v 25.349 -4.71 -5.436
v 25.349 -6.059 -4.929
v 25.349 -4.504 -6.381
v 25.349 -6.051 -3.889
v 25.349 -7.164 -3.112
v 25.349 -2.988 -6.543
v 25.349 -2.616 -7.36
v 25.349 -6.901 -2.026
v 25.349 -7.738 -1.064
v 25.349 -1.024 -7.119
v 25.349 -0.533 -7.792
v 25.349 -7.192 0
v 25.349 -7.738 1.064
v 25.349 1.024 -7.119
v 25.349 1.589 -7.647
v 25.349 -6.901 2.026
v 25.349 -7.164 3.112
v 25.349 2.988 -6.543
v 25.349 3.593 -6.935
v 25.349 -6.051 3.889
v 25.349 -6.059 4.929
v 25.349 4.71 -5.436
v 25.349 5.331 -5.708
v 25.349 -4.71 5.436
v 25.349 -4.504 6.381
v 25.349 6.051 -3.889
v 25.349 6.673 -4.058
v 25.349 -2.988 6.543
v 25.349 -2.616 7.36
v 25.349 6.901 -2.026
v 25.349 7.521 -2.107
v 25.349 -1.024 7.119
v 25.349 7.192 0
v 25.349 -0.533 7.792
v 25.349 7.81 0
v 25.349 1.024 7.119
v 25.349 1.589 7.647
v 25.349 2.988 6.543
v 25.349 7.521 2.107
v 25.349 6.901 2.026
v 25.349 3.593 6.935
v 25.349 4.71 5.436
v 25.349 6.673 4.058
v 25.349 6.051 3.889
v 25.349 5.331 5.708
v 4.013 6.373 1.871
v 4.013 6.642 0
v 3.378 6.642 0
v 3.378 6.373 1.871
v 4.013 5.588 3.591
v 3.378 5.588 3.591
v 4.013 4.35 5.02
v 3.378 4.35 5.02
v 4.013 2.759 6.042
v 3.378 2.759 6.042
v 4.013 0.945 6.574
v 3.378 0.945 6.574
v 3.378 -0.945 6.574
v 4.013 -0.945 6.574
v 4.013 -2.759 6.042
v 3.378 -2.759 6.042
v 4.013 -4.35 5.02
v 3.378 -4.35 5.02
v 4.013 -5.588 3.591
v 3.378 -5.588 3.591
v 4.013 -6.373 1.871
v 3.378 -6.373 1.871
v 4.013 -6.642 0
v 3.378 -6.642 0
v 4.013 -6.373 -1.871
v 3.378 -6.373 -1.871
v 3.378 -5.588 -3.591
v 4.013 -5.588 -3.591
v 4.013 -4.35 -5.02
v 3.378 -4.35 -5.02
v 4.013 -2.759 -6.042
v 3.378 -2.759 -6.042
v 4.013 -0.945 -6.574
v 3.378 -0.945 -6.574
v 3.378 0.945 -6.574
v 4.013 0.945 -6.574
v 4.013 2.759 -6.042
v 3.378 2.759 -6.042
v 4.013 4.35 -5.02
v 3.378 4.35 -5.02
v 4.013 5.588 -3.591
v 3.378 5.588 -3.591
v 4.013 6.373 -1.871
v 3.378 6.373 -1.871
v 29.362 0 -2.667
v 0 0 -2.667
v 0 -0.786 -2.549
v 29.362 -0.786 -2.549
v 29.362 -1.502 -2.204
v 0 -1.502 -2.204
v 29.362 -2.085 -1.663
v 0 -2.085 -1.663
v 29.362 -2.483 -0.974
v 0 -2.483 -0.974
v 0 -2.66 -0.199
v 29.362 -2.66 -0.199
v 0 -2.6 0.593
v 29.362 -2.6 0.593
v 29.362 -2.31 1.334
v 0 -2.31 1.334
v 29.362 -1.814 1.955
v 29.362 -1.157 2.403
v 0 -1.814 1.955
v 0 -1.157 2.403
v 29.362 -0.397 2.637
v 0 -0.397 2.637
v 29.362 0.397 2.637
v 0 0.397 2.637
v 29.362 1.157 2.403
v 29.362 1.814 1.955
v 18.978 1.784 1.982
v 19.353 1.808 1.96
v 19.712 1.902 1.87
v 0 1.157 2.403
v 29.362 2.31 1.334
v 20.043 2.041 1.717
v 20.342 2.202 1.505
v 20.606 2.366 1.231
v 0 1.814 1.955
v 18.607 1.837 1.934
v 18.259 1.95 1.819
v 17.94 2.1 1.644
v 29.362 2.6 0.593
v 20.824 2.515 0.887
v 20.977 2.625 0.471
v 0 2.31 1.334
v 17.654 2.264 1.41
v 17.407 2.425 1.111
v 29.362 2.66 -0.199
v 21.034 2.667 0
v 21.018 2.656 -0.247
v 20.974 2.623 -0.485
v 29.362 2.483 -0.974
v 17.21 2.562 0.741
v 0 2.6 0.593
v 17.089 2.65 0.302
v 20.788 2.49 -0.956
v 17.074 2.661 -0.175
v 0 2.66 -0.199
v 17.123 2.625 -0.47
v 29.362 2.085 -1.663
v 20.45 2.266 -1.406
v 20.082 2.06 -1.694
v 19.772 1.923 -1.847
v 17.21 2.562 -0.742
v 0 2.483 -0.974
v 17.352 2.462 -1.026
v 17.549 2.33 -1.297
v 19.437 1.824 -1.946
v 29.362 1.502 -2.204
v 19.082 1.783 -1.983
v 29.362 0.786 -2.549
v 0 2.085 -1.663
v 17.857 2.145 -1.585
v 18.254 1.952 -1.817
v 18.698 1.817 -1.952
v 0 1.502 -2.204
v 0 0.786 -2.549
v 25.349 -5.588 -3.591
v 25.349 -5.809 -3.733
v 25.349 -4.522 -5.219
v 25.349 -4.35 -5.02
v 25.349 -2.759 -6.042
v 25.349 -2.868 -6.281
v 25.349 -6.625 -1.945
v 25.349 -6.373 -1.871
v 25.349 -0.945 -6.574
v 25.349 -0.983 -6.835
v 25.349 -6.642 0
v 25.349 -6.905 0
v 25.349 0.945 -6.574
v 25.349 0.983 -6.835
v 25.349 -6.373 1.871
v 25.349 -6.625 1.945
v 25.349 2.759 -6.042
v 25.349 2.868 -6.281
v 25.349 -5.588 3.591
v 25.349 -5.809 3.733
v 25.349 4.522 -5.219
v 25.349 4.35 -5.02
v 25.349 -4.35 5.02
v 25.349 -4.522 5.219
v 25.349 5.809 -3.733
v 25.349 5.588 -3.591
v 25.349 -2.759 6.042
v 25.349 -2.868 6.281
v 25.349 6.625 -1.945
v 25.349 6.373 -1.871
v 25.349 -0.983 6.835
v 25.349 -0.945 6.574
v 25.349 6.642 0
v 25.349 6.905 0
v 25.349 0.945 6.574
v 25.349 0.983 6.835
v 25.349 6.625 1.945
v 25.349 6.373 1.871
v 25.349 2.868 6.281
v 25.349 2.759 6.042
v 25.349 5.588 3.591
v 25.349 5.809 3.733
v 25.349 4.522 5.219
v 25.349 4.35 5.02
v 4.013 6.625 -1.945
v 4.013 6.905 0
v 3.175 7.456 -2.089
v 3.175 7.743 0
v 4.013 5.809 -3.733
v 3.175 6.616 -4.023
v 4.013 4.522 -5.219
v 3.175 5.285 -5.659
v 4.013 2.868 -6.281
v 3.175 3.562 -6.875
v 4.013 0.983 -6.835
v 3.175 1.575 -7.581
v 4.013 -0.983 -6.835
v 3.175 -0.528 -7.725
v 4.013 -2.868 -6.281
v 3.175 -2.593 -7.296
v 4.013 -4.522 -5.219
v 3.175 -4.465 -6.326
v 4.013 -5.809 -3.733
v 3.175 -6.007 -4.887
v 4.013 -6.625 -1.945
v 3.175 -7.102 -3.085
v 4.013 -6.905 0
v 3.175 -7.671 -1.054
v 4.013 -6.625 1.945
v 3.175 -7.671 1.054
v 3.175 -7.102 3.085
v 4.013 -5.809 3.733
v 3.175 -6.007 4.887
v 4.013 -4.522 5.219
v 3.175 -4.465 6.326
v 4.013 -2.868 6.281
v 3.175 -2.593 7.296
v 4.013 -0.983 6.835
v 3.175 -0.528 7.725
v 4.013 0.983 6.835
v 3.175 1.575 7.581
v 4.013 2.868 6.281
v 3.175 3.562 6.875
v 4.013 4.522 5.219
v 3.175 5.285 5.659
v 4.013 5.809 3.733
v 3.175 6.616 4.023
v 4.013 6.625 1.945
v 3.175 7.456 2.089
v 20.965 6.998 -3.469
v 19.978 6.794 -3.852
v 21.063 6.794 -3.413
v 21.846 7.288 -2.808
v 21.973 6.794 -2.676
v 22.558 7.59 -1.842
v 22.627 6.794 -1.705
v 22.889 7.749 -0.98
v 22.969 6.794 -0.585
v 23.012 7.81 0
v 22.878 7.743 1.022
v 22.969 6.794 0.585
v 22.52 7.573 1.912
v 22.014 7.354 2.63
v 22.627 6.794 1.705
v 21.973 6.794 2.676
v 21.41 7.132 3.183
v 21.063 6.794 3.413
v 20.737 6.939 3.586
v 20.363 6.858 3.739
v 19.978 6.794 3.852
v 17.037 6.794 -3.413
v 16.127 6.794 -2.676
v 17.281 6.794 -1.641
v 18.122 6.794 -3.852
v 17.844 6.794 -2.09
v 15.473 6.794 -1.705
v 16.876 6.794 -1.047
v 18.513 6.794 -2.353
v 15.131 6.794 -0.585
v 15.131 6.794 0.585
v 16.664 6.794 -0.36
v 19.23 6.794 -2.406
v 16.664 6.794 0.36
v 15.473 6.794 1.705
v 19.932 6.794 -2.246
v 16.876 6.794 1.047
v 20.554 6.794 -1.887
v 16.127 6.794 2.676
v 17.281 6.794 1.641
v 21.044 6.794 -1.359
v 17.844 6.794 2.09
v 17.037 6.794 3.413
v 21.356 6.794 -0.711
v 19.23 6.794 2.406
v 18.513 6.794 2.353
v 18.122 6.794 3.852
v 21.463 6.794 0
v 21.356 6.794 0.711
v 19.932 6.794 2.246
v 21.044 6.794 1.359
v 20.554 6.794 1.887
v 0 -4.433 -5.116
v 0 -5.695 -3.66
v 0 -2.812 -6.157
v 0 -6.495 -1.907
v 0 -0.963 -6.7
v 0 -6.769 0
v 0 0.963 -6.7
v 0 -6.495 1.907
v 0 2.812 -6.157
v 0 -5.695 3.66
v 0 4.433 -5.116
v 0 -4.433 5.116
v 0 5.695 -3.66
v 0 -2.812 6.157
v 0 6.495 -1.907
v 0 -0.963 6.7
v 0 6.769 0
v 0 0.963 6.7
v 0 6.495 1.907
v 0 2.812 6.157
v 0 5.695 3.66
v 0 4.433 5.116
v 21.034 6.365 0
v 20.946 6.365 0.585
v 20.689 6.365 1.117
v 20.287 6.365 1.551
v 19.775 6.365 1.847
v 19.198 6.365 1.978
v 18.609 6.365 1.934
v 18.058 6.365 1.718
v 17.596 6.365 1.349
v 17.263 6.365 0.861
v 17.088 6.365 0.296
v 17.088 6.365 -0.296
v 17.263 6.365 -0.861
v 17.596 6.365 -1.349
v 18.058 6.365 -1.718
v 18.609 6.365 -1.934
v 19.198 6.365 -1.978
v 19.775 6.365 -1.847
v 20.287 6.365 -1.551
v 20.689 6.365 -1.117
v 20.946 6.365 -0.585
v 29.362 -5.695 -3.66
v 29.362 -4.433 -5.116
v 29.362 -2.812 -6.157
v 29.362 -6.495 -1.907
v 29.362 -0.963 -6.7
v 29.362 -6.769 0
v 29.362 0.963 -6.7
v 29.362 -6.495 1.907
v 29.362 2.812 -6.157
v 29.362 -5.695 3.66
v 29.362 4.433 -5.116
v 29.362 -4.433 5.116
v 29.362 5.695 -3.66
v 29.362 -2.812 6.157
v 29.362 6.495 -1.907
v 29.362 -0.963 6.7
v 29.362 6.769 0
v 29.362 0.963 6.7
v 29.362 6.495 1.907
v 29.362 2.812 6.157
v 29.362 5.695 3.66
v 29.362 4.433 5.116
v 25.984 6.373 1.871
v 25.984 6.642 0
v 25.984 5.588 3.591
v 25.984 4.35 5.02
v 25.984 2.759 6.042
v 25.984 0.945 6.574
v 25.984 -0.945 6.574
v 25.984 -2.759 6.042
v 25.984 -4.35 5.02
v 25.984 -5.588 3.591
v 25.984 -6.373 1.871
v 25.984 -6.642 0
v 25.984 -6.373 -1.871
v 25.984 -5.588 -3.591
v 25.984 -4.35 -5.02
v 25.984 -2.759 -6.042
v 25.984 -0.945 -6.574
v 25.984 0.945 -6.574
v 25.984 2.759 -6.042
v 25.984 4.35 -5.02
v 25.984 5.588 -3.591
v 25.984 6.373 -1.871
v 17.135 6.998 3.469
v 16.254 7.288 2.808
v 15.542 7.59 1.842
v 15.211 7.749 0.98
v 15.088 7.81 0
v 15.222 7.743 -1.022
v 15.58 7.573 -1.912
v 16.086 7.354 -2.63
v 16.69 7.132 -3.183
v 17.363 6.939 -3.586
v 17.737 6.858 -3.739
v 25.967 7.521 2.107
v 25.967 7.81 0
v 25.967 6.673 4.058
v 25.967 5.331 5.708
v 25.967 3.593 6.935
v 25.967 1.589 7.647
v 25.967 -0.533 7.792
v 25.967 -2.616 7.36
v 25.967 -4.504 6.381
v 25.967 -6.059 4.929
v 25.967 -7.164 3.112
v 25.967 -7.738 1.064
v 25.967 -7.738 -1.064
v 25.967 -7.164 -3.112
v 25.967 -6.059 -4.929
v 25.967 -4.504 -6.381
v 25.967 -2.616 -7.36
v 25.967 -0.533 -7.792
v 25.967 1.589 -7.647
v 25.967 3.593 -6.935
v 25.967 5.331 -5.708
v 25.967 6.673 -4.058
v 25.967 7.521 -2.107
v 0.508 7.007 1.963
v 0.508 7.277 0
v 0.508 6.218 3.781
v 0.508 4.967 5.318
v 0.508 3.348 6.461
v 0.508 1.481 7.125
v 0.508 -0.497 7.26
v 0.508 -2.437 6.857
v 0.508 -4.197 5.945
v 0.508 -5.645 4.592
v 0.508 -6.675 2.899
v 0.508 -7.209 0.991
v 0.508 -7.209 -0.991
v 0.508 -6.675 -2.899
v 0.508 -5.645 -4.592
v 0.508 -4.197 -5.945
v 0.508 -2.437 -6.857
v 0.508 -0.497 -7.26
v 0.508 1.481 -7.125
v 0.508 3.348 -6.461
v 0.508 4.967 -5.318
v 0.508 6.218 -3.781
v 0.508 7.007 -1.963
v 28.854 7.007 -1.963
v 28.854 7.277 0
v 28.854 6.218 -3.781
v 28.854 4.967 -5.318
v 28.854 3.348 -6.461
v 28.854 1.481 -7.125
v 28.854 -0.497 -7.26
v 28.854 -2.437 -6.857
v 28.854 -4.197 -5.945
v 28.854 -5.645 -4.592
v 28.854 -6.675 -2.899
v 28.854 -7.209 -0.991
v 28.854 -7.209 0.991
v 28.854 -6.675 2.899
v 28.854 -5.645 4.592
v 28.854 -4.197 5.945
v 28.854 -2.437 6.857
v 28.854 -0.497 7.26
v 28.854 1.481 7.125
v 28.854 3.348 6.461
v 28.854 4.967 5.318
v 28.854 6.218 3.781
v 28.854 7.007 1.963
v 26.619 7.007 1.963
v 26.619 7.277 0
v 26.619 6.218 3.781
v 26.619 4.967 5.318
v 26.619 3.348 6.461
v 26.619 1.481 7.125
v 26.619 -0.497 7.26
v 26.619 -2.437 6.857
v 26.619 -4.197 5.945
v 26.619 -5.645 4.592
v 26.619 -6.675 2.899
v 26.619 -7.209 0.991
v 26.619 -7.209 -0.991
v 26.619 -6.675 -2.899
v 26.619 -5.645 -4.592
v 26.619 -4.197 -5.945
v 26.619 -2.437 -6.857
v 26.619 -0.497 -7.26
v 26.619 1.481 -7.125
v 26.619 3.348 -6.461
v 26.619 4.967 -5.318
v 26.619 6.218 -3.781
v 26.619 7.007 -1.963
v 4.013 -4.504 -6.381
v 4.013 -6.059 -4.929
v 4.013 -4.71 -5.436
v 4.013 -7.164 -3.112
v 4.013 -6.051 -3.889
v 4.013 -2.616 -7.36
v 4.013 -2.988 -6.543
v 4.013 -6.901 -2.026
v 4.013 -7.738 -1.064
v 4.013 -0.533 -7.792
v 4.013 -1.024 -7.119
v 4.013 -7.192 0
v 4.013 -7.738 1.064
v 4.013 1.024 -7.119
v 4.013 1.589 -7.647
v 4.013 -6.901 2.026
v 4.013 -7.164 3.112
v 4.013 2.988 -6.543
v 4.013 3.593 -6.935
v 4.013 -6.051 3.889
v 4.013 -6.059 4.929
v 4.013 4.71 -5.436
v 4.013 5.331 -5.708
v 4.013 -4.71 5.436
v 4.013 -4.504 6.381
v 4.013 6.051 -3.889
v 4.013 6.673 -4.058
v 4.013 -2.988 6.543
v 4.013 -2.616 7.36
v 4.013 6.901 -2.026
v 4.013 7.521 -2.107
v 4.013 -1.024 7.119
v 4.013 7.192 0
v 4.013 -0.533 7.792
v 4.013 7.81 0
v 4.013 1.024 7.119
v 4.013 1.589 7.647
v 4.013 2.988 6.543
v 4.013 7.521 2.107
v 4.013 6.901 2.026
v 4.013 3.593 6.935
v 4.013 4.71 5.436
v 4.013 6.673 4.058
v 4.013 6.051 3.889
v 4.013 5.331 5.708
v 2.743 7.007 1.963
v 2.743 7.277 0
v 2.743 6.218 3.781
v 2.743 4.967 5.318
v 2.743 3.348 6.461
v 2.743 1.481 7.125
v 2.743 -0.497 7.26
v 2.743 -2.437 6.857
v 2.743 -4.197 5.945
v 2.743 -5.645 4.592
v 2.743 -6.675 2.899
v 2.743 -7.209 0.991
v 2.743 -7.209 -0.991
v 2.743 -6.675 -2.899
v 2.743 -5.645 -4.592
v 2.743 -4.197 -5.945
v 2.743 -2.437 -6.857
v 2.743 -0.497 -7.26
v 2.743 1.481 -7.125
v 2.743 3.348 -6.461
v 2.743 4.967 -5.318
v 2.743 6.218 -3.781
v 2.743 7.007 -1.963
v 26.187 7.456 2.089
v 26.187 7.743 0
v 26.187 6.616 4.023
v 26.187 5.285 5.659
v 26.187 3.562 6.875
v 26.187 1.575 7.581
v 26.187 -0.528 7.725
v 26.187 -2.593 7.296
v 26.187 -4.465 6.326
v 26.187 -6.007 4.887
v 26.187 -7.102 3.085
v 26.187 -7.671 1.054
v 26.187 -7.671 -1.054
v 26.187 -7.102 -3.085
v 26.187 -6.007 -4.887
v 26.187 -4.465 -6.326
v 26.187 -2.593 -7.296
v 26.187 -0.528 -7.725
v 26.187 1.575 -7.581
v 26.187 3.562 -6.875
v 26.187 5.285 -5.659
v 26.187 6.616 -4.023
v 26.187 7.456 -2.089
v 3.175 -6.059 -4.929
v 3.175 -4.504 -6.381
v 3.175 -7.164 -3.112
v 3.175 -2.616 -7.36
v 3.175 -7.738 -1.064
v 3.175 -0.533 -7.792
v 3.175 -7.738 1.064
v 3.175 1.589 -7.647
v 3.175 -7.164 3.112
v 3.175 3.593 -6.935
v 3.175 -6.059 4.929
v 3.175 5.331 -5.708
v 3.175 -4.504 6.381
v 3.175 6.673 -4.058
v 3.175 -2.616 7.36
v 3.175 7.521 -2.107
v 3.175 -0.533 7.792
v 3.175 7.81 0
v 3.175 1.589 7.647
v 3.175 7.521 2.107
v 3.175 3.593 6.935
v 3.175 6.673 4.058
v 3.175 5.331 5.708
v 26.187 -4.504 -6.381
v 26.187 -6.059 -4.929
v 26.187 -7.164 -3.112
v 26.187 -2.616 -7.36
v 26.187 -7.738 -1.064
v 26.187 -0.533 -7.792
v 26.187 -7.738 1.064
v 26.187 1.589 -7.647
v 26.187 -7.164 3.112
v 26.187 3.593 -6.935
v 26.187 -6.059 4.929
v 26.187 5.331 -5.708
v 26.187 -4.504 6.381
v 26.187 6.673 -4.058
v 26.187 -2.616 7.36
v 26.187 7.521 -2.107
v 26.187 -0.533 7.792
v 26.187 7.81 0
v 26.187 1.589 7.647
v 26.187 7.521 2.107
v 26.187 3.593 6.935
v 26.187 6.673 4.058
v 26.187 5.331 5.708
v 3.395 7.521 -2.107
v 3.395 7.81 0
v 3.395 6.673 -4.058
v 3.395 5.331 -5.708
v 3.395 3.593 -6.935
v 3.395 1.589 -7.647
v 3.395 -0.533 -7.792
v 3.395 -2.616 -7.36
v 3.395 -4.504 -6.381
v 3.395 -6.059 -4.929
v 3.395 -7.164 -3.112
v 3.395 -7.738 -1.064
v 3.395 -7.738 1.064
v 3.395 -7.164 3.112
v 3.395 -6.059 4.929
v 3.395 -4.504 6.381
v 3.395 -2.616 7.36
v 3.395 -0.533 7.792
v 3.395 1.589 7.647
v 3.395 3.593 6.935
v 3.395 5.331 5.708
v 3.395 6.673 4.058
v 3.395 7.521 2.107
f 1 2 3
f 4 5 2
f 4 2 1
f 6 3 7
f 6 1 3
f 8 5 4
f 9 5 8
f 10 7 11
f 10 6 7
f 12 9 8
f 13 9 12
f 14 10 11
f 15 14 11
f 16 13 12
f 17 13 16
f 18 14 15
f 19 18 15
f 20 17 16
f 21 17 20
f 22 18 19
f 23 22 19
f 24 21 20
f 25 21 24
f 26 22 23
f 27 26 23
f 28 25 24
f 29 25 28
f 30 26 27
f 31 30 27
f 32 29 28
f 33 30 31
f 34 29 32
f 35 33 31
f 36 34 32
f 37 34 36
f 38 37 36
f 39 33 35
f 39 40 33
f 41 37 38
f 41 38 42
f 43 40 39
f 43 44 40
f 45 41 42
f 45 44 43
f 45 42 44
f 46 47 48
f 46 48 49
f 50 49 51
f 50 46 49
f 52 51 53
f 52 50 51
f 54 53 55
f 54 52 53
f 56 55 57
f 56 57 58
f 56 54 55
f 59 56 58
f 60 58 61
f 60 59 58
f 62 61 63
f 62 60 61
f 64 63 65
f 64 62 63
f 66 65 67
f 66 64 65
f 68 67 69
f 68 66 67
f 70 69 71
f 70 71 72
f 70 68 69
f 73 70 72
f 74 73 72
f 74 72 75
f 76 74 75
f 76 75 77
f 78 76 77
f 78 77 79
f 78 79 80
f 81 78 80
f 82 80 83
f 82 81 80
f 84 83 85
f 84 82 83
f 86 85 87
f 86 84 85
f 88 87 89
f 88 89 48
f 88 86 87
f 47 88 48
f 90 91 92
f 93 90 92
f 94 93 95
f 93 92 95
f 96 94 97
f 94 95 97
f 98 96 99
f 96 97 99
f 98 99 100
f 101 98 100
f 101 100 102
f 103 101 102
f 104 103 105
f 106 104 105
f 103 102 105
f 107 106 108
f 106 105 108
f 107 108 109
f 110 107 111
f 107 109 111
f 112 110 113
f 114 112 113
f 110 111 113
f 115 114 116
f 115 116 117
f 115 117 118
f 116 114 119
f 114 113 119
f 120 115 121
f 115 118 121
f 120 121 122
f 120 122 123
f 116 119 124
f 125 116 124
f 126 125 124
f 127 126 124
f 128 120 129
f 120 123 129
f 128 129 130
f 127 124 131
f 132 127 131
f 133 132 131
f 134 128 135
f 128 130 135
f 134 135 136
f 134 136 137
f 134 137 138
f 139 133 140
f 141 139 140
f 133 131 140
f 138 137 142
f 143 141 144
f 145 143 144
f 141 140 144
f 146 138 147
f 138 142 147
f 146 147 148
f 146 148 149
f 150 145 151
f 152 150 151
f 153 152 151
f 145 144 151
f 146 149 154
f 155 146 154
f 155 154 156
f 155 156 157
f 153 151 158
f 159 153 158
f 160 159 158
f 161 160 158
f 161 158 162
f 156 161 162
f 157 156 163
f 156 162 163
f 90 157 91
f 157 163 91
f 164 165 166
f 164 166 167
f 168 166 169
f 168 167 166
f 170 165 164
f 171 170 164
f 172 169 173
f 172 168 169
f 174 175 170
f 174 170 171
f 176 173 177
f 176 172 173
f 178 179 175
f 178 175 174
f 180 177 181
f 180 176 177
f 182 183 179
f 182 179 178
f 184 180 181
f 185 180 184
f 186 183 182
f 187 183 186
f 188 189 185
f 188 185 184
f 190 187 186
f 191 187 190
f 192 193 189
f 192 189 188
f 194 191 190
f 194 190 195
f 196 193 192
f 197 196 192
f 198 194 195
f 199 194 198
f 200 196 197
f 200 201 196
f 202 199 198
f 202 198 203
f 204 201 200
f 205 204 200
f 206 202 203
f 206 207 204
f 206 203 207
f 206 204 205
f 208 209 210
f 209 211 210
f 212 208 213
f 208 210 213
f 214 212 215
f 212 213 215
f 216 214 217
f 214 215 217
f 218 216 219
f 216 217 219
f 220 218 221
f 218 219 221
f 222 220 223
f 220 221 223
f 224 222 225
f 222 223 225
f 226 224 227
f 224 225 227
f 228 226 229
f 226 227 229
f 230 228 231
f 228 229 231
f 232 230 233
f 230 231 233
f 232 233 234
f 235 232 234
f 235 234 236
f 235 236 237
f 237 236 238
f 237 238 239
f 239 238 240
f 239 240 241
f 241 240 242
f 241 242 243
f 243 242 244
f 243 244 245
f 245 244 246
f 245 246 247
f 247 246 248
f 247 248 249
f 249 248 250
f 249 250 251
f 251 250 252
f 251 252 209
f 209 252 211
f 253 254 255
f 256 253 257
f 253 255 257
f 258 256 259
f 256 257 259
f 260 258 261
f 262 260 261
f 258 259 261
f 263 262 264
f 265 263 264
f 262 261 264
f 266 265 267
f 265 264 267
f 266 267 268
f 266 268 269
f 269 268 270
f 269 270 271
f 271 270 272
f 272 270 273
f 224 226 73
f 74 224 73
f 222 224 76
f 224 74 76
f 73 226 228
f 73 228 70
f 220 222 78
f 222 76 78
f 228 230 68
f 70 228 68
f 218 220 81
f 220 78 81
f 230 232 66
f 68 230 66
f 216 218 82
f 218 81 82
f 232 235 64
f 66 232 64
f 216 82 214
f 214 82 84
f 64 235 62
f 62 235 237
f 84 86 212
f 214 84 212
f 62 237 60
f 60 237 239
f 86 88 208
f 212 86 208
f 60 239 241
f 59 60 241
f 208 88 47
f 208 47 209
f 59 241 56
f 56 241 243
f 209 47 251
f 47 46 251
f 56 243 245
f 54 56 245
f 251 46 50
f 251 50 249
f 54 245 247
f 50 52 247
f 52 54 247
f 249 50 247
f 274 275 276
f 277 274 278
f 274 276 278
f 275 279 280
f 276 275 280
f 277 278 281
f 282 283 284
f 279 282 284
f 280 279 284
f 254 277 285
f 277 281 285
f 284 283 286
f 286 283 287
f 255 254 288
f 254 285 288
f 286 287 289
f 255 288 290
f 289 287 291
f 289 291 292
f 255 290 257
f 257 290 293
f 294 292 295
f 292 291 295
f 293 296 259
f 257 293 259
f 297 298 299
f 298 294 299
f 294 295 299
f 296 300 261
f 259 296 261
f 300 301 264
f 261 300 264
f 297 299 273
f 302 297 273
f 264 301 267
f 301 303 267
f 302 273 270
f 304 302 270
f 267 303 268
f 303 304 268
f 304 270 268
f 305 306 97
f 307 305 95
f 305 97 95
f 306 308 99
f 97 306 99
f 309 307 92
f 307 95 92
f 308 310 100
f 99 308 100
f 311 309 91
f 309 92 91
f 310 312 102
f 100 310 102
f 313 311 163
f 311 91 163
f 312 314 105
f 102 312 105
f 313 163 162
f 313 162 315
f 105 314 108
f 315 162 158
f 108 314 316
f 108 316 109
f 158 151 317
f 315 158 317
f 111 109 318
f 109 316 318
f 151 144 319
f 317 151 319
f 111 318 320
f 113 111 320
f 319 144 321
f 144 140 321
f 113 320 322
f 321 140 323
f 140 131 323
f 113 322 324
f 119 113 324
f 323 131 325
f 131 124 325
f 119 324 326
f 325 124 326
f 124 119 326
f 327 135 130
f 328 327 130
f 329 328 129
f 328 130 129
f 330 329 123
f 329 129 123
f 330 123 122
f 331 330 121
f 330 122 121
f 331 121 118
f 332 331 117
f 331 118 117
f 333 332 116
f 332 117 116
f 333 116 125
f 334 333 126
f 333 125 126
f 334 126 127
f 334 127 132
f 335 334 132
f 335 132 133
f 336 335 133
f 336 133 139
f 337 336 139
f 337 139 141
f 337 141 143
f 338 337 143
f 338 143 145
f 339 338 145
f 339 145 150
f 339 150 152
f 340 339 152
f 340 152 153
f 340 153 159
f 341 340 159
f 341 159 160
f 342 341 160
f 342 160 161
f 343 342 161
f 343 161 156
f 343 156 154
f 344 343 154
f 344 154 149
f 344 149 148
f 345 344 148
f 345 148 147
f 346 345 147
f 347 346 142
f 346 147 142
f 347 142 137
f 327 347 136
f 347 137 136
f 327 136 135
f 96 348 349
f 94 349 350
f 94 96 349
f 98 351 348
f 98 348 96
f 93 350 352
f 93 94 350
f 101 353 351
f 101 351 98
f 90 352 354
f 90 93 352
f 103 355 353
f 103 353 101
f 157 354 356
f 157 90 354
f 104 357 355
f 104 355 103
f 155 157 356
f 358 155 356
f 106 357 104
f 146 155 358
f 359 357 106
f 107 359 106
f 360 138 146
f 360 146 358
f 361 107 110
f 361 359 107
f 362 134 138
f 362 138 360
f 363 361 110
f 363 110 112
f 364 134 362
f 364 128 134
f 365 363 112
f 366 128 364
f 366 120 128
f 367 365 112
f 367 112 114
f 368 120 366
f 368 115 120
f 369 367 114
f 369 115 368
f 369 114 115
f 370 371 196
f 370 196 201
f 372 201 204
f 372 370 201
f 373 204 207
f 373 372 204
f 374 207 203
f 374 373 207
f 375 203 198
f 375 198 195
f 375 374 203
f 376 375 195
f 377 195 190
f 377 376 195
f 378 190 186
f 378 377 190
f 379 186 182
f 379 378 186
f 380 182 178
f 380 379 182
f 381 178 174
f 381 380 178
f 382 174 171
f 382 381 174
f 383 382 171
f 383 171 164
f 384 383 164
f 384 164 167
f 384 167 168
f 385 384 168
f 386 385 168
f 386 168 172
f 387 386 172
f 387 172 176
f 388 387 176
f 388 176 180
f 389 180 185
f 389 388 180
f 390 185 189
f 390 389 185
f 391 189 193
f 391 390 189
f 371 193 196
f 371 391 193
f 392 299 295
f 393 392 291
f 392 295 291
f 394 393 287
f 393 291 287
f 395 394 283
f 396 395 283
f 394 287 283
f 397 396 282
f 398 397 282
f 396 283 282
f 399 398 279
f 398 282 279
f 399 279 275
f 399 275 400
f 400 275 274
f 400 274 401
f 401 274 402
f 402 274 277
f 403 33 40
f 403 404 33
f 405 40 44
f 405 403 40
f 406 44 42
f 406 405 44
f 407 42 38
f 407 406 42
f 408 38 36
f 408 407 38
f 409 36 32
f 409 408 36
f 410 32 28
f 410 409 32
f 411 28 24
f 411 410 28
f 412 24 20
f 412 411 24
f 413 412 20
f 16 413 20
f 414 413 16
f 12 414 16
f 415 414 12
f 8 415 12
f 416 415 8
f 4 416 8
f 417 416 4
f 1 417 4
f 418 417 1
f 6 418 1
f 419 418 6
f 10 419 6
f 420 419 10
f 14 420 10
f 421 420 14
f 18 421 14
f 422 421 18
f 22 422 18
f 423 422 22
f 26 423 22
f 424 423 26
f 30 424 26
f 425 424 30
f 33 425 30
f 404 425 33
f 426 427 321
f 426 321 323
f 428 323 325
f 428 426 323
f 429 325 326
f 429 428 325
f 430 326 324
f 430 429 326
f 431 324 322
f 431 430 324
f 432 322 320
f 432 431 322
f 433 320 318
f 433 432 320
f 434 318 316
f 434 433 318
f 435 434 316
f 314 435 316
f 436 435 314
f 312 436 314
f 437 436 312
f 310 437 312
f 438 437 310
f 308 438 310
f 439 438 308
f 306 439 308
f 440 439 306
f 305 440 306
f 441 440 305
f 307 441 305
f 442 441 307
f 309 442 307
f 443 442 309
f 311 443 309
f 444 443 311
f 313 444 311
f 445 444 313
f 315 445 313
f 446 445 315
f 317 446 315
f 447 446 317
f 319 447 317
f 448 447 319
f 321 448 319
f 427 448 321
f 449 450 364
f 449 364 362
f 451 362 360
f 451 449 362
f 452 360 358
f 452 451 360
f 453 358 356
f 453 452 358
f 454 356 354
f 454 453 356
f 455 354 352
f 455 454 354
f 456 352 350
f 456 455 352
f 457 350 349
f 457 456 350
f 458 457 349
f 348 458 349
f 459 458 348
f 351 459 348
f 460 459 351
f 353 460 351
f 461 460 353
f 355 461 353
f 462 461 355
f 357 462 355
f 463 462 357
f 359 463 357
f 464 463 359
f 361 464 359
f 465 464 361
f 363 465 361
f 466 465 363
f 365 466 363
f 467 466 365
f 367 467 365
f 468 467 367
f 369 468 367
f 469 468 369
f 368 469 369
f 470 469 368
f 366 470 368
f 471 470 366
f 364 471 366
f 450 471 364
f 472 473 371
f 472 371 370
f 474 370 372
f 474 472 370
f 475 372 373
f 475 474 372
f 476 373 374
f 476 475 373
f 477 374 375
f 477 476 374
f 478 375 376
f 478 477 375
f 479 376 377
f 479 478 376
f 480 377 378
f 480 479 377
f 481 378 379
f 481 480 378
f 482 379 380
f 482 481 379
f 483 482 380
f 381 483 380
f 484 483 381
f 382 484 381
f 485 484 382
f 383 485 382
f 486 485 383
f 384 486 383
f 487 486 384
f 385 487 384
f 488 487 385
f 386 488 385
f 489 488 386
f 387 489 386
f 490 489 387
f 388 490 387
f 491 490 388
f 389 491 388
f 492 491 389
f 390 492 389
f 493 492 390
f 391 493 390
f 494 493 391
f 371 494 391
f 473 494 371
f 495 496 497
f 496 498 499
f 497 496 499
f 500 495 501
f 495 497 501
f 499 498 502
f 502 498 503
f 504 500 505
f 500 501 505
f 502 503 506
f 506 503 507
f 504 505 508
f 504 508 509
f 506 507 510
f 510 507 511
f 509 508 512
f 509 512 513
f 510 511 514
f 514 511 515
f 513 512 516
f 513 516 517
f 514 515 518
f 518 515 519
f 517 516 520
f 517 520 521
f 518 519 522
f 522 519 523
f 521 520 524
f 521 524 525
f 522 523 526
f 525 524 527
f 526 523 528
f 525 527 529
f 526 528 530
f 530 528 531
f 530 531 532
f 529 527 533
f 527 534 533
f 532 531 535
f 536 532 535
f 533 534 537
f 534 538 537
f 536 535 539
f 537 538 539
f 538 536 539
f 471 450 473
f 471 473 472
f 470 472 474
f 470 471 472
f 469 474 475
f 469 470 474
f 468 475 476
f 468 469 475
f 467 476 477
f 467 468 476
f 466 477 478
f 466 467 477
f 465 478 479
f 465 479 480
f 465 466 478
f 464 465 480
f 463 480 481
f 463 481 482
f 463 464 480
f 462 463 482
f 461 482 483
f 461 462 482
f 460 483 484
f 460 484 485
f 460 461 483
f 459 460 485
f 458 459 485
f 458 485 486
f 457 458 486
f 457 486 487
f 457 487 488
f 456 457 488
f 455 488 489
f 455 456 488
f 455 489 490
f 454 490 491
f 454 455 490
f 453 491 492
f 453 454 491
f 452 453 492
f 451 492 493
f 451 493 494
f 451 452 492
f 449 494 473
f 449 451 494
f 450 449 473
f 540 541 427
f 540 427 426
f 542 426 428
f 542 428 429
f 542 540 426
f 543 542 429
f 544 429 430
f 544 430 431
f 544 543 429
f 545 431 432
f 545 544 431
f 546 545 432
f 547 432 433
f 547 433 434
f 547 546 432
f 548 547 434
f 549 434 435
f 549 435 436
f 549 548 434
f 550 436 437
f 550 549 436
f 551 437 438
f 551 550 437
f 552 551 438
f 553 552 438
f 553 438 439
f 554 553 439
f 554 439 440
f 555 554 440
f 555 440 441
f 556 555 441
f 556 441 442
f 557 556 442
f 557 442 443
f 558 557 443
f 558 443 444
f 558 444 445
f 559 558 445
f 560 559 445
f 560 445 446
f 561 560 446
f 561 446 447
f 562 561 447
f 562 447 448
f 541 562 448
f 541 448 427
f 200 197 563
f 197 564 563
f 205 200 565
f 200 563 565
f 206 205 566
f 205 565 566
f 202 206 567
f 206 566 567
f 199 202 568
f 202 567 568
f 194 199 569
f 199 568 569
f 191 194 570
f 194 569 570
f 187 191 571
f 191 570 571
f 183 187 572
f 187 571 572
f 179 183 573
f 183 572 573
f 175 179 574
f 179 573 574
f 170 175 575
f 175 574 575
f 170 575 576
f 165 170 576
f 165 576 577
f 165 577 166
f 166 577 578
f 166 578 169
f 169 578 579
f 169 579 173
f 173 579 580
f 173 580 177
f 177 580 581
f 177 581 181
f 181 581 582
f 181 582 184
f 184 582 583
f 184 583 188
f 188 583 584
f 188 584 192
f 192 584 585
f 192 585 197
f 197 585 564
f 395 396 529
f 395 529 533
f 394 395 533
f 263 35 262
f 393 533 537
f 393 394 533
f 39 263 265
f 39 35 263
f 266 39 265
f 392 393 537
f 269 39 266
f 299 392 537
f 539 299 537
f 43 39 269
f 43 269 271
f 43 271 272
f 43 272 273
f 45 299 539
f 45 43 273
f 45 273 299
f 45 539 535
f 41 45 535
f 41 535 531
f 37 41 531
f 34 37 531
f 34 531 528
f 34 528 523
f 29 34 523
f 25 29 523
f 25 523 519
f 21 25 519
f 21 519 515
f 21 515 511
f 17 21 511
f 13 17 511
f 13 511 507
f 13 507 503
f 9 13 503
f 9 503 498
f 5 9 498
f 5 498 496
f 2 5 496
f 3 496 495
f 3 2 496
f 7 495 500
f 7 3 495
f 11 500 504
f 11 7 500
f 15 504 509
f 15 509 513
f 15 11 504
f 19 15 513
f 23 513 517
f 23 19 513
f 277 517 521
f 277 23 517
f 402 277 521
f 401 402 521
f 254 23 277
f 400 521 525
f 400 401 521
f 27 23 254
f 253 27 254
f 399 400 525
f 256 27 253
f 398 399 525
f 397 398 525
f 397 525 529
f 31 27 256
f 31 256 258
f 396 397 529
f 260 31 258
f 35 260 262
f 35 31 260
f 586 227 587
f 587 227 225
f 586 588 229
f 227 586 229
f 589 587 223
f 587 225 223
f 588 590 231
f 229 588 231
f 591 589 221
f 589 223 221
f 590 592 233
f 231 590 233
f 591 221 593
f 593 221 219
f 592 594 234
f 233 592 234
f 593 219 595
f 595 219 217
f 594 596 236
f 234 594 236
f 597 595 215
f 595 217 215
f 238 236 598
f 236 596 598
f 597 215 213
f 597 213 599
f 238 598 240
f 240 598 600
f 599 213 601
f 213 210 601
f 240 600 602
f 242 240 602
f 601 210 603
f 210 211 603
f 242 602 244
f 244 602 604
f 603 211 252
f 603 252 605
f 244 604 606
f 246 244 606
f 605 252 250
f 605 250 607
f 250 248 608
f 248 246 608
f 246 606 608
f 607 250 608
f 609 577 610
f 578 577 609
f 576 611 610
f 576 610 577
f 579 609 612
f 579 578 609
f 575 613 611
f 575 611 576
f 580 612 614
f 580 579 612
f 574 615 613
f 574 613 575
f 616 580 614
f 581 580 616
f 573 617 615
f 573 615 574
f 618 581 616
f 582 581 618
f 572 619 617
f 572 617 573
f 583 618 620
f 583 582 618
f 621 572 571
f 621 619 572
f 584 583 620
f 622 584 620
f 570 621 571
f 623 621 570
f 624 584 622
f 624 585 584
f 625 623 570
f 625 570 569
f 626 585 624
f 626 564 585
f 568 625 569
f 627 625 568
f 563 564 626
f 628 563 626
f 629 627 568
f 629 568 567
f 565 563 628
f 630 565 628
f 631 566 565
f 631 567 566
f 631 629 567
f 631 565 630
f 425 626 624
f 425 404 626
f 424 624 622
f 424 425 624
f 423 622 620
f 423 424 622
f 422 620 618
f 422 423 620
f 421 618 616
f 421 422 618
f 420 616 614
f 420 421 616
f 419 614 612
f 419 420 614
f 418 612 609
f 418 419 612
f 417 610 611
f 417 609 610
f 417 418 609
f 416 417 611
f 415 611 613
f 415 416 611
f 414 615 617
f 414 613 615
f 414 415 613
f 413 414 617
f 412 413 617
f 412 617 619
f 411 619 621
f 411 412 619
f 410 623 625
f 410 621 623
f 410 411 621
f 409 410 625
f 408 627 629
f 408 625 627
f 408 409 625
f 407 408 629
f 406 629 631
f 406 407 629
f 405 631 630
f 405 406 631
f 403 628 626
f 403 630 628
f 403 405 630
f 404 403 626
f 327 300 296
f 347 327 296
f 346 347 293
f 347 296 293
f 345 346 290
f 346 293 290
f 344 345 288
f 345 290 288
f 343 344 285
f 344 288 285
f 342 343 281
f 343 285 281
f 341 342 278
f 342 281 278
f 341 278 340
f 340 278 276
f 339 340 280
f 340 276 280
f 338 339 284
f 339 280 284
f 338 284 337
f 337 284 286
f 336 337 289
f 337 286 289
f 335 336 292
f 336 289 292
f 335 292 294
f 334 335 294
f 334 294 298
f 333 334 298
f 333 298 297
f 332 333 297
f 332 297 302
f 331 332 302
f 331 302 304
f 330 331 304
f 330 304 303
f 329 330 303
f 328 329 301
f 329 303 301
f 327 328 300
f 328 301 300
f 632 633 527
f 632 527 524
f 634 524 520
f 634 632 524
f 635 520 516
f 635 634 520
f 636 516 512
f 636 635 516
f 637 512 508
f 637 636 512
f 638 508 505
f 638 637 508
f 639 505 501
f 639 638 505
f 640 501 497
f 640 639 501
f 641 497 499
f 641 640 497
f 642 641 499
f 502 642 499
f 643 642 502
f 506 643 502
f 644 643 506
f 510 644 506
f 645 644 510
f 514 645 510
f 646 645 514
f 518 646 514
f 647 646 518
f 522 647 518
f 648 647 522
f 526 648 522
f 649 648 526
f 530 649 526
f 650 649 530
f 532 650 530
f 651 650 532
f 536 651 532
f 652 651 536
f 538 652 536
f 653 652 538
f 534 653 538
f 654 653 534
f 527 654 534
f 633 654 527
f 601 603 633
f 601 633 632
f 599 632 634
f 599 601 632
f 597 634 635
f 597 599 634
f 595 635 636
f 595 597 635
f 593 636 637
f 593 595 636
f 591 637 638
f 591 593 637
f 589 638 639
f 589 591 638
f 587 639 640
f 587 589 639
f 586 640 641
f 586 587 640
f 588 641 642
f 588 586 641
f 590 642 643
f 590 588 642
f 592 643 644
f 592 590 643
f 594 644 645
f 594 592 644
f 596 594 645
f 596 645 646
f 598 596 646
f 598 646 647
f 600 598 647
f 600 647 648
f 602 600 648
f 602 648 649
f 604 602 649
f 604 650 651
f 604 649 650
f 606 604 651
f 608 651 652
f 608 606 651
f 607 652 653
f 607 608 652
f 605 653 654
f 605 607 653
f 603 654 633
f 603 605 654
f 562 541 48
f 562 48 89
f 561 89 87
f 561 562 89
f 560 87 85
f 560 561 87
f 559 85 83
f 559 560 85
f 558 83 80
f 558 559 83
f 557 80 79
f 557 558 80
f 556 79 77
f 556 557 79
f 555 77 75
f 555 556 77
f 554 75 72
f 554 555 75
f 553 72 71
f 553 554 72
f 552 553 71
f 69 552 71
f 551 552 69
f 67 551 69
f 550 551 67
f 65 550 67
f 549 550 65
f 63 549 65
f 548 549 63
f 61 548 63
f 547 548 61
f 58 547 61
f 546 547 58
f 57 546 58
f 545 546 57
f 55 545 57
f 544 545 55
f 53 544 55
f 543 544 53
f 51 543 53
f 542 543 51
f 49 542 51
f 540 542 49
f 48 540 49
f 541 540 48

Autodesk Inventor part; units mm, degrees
sketch "Sketch_1" plane through (0, 0, 0) normal (0, 0, 1) x (1, 0, 0)
  line L0 (29.3624, 0) -> (0, 0)
  line L1 (0, 0) -> (0, 6.7691)
  line L2 (0, 6.7691) -> (0.508, 7.2771)
  line L3 (0.508, 7.2771) -> (2.7432, 7.2771)
  line L4 (2.7432, 7.2771) -> (3.3782, 6.6421)
  line L5 (3.3782, 6.6421) -> (4.0132, 6.6421)
  line L6 (4.0132, 6.6421) -> (4.0132, 7.8105)
  line L7 (4.0132, 7.8105) -> (25.3492, 7.8105)
  line L8 (25.3492, 7.8105) -> (25.3492, 6.6421)
  line L9 (25.3492, 6.6421) -> (25.9842, 6.6421)
  line L10 (25.9842, 6.6421) -> (26.6192, 7.2771)
  line L11 (26.6192, 7.2771) -> (28.8544, 7.2771)
  line L12 (28.8544, 7.2771) -> (29.3624, 6.7691)
  line L13 (29.3624, 6.7691) -> (29.3624, 0)
  line L14 (29.3624, 0) -> (0, 0)
revolve "Revolution1" add sketch "Sketch_1" angle 360 about axis through (29.3624, 0, 0) along (1, 0, 0)
sketch "Sketch2" plane through (29.3624, 0, 0) normal (1, 0, 0) x (0, 0, -1)
  point P0 (0, 0)
hole "Hole1" at (29.3624, 0, 0) direction (-1, 0, 0) diameter 5.334 depth 29.3624
sketch "Sketch_6" plane through (0, 0, 0) normal (0, 0, 1) x (1, 0, 0)
  line L0 (19.05, 0) -> (19.05, 7.8105)
  line L1 (19.05, 7.8105) -> (23.0124, 7.8105)
  line L2 (23.0124, 7.8105) -> (23.0124, 6.7945)
  line L3 (23.0124, 6.7945) -> (21.463, 6.7945)
  line L4 (21.463, 6.7945) -> (21.0337, 6.3652)
  line L5 (21.0337, 6.3652) -> (21.0337, 0)
  line L6 (21.0337, 0) -> (19.05, 0)
  line L7 (19.05, 0) -> (19.05, 7.8105)
revolve "Revolution2" cut sketch "Sketch_6" angle 360 about axis through (19.05, 0, 0) along (0, -1, 0)
thread "Thread1" size "10-32 UNF" class "2B" standard "ANSI Unified Screw Threads" length 2.4257 offset 2.5862
sketch "Sketch_8" plane through (0, 0, 0) normal (0, 0, 1) x (1, 0, 0)
  line L0 (29.3624, 0) -> (-29.3624, 0)
  line L1 (24.7988, 6.6421) -> (25.0862, 6.6421)
  line L2 (25.0862, 6.6421) -> (26.1874, 7.7433)
  line L3 (26.1874, 7.7433) -> (26.1874, 7.8105)
  line L4 (26.1874, 7.8105) -> (25.9672, 7.8105)
  line L5 (25.9672, 7.8105) -> (24.7988, 6.6421)
revolve "Revolution3" add sketch "Sketch_8" angle 360 about axis through (29.3624, 0, 0) along (1, 0, 0)
sketch "Sketch_14" plane through (0, 0, 0) normal (0, 0, 1) x (1, 0, 0)
  line L0 (29.3624, 0) -> (-29.3624, 0)
  line L1 (3.175, 7.7433) -> (4.2762, 6.6421)
  line L2 (4.2762, 6.6421) -> (4.5636, 6.6421)
  line L3 (4.5636, 6.6421) -> (3.3952, 7.8105)
  line L4 (3.3952, 7.8105) -> (3.175, 7.8105)
  line L5 (3.175, 7.8105) -> (3.175, 7.7433)
revolve "Revolution4" add sketch "Sketch_14" angle 360 about axis through (29.3624, 0, 0) along (1, 0, 0)
ref_plane "ba2_XY" through (19.05, 7.8105, 0) normal (0, 0, 1) x (1, 0, 0)
ref_plane "ba2_YZ" through (19.05, 7.8105, 0) normal (1, 0, 0) x (0, 1, 0)
ref_plane "ba2_ZX" through (19.05, 7.8105, 0) normal (0, 1, 0) x (0, 0, 1)
ref_plane "centar_XY" through (14.6812, 0, 0) normal (1, 0, 0) x (0, 0, -1)
ref_plane "centar_YZ" through (14.6812, 0, 0) normal (0, 0, -1) x (0, 1, 0)
ref_plane "centar_ZX" through (14.6812, 0, 0) normal (0, 1, 0) x (1, 0, 0)
ref_plane "d1_XY" through (21.463, 6.7945, 0) normal (0, 0, 1) x (1, 0, 0)
ref_plane "d1_YZ" through (21.463, 6.7945, 0) normal (1, 0, 0) x (0, 1, 0)
ref_plane "d1_ZX" through (21.463, 6.7945, 0) normal (0, 1, 0) x (0, 0, 1)
ref_plane "d2_XY" through (16.637, 6.7945, 0) normal (0, 0, 1) x (1, 0, 0)
ref_plane "d2_YZ" through (16.637, 6.7945, 0) normal (1, 0, 0) x (0, 1, 0)
ref_plane "d2_ZX" through (16.637, 6.7945, 0) normal (0, 1, 0) x (0, 0, 1)
ref_plane "to_cyl_A_XY" through (2.7432, 0, 0) normal (1, 0, 0) x (0, 0, -1)
ref_plane "to_cyl_A_YZ" through (2.7432, 0, 0) normal (0, 0, -1) x (0, 1, 0)
ref_plane "to_cyl_A_ZX" through (2.7432, 0, 0) normal (0, 1, 0) x (1, 0, 0)
ref_plane "to_cyl_B_XY" through (26.6192, 0, 0) normal (1, 0, 0) x (0, 0, -1)
ref_plane "to_cyl_B_YZ" through (26.6192, 0, 0) normal (0, 0, -1) x (0, 1, 0)
ref_plane "to_cyl_B_ZX" through (26.6192, 0, 0) normal (0, 1, 0) x (1, 0, 0)
ref_plane "to_rod_A_XY" through (29.3624, 0, 0) normal (1, 0, 0) x (0, 0, -1)
ref_plane "to_rod_A_YZ" through (29.3624, 0, 0) normal (0, 0, -1) x (0, 1, 0)
ref_plane "to_rod_A_ZX" through (29.3624, 0, 0) normal (0, 1, 0) x (1, 0, 0)
properties part number "D-68355---0"
